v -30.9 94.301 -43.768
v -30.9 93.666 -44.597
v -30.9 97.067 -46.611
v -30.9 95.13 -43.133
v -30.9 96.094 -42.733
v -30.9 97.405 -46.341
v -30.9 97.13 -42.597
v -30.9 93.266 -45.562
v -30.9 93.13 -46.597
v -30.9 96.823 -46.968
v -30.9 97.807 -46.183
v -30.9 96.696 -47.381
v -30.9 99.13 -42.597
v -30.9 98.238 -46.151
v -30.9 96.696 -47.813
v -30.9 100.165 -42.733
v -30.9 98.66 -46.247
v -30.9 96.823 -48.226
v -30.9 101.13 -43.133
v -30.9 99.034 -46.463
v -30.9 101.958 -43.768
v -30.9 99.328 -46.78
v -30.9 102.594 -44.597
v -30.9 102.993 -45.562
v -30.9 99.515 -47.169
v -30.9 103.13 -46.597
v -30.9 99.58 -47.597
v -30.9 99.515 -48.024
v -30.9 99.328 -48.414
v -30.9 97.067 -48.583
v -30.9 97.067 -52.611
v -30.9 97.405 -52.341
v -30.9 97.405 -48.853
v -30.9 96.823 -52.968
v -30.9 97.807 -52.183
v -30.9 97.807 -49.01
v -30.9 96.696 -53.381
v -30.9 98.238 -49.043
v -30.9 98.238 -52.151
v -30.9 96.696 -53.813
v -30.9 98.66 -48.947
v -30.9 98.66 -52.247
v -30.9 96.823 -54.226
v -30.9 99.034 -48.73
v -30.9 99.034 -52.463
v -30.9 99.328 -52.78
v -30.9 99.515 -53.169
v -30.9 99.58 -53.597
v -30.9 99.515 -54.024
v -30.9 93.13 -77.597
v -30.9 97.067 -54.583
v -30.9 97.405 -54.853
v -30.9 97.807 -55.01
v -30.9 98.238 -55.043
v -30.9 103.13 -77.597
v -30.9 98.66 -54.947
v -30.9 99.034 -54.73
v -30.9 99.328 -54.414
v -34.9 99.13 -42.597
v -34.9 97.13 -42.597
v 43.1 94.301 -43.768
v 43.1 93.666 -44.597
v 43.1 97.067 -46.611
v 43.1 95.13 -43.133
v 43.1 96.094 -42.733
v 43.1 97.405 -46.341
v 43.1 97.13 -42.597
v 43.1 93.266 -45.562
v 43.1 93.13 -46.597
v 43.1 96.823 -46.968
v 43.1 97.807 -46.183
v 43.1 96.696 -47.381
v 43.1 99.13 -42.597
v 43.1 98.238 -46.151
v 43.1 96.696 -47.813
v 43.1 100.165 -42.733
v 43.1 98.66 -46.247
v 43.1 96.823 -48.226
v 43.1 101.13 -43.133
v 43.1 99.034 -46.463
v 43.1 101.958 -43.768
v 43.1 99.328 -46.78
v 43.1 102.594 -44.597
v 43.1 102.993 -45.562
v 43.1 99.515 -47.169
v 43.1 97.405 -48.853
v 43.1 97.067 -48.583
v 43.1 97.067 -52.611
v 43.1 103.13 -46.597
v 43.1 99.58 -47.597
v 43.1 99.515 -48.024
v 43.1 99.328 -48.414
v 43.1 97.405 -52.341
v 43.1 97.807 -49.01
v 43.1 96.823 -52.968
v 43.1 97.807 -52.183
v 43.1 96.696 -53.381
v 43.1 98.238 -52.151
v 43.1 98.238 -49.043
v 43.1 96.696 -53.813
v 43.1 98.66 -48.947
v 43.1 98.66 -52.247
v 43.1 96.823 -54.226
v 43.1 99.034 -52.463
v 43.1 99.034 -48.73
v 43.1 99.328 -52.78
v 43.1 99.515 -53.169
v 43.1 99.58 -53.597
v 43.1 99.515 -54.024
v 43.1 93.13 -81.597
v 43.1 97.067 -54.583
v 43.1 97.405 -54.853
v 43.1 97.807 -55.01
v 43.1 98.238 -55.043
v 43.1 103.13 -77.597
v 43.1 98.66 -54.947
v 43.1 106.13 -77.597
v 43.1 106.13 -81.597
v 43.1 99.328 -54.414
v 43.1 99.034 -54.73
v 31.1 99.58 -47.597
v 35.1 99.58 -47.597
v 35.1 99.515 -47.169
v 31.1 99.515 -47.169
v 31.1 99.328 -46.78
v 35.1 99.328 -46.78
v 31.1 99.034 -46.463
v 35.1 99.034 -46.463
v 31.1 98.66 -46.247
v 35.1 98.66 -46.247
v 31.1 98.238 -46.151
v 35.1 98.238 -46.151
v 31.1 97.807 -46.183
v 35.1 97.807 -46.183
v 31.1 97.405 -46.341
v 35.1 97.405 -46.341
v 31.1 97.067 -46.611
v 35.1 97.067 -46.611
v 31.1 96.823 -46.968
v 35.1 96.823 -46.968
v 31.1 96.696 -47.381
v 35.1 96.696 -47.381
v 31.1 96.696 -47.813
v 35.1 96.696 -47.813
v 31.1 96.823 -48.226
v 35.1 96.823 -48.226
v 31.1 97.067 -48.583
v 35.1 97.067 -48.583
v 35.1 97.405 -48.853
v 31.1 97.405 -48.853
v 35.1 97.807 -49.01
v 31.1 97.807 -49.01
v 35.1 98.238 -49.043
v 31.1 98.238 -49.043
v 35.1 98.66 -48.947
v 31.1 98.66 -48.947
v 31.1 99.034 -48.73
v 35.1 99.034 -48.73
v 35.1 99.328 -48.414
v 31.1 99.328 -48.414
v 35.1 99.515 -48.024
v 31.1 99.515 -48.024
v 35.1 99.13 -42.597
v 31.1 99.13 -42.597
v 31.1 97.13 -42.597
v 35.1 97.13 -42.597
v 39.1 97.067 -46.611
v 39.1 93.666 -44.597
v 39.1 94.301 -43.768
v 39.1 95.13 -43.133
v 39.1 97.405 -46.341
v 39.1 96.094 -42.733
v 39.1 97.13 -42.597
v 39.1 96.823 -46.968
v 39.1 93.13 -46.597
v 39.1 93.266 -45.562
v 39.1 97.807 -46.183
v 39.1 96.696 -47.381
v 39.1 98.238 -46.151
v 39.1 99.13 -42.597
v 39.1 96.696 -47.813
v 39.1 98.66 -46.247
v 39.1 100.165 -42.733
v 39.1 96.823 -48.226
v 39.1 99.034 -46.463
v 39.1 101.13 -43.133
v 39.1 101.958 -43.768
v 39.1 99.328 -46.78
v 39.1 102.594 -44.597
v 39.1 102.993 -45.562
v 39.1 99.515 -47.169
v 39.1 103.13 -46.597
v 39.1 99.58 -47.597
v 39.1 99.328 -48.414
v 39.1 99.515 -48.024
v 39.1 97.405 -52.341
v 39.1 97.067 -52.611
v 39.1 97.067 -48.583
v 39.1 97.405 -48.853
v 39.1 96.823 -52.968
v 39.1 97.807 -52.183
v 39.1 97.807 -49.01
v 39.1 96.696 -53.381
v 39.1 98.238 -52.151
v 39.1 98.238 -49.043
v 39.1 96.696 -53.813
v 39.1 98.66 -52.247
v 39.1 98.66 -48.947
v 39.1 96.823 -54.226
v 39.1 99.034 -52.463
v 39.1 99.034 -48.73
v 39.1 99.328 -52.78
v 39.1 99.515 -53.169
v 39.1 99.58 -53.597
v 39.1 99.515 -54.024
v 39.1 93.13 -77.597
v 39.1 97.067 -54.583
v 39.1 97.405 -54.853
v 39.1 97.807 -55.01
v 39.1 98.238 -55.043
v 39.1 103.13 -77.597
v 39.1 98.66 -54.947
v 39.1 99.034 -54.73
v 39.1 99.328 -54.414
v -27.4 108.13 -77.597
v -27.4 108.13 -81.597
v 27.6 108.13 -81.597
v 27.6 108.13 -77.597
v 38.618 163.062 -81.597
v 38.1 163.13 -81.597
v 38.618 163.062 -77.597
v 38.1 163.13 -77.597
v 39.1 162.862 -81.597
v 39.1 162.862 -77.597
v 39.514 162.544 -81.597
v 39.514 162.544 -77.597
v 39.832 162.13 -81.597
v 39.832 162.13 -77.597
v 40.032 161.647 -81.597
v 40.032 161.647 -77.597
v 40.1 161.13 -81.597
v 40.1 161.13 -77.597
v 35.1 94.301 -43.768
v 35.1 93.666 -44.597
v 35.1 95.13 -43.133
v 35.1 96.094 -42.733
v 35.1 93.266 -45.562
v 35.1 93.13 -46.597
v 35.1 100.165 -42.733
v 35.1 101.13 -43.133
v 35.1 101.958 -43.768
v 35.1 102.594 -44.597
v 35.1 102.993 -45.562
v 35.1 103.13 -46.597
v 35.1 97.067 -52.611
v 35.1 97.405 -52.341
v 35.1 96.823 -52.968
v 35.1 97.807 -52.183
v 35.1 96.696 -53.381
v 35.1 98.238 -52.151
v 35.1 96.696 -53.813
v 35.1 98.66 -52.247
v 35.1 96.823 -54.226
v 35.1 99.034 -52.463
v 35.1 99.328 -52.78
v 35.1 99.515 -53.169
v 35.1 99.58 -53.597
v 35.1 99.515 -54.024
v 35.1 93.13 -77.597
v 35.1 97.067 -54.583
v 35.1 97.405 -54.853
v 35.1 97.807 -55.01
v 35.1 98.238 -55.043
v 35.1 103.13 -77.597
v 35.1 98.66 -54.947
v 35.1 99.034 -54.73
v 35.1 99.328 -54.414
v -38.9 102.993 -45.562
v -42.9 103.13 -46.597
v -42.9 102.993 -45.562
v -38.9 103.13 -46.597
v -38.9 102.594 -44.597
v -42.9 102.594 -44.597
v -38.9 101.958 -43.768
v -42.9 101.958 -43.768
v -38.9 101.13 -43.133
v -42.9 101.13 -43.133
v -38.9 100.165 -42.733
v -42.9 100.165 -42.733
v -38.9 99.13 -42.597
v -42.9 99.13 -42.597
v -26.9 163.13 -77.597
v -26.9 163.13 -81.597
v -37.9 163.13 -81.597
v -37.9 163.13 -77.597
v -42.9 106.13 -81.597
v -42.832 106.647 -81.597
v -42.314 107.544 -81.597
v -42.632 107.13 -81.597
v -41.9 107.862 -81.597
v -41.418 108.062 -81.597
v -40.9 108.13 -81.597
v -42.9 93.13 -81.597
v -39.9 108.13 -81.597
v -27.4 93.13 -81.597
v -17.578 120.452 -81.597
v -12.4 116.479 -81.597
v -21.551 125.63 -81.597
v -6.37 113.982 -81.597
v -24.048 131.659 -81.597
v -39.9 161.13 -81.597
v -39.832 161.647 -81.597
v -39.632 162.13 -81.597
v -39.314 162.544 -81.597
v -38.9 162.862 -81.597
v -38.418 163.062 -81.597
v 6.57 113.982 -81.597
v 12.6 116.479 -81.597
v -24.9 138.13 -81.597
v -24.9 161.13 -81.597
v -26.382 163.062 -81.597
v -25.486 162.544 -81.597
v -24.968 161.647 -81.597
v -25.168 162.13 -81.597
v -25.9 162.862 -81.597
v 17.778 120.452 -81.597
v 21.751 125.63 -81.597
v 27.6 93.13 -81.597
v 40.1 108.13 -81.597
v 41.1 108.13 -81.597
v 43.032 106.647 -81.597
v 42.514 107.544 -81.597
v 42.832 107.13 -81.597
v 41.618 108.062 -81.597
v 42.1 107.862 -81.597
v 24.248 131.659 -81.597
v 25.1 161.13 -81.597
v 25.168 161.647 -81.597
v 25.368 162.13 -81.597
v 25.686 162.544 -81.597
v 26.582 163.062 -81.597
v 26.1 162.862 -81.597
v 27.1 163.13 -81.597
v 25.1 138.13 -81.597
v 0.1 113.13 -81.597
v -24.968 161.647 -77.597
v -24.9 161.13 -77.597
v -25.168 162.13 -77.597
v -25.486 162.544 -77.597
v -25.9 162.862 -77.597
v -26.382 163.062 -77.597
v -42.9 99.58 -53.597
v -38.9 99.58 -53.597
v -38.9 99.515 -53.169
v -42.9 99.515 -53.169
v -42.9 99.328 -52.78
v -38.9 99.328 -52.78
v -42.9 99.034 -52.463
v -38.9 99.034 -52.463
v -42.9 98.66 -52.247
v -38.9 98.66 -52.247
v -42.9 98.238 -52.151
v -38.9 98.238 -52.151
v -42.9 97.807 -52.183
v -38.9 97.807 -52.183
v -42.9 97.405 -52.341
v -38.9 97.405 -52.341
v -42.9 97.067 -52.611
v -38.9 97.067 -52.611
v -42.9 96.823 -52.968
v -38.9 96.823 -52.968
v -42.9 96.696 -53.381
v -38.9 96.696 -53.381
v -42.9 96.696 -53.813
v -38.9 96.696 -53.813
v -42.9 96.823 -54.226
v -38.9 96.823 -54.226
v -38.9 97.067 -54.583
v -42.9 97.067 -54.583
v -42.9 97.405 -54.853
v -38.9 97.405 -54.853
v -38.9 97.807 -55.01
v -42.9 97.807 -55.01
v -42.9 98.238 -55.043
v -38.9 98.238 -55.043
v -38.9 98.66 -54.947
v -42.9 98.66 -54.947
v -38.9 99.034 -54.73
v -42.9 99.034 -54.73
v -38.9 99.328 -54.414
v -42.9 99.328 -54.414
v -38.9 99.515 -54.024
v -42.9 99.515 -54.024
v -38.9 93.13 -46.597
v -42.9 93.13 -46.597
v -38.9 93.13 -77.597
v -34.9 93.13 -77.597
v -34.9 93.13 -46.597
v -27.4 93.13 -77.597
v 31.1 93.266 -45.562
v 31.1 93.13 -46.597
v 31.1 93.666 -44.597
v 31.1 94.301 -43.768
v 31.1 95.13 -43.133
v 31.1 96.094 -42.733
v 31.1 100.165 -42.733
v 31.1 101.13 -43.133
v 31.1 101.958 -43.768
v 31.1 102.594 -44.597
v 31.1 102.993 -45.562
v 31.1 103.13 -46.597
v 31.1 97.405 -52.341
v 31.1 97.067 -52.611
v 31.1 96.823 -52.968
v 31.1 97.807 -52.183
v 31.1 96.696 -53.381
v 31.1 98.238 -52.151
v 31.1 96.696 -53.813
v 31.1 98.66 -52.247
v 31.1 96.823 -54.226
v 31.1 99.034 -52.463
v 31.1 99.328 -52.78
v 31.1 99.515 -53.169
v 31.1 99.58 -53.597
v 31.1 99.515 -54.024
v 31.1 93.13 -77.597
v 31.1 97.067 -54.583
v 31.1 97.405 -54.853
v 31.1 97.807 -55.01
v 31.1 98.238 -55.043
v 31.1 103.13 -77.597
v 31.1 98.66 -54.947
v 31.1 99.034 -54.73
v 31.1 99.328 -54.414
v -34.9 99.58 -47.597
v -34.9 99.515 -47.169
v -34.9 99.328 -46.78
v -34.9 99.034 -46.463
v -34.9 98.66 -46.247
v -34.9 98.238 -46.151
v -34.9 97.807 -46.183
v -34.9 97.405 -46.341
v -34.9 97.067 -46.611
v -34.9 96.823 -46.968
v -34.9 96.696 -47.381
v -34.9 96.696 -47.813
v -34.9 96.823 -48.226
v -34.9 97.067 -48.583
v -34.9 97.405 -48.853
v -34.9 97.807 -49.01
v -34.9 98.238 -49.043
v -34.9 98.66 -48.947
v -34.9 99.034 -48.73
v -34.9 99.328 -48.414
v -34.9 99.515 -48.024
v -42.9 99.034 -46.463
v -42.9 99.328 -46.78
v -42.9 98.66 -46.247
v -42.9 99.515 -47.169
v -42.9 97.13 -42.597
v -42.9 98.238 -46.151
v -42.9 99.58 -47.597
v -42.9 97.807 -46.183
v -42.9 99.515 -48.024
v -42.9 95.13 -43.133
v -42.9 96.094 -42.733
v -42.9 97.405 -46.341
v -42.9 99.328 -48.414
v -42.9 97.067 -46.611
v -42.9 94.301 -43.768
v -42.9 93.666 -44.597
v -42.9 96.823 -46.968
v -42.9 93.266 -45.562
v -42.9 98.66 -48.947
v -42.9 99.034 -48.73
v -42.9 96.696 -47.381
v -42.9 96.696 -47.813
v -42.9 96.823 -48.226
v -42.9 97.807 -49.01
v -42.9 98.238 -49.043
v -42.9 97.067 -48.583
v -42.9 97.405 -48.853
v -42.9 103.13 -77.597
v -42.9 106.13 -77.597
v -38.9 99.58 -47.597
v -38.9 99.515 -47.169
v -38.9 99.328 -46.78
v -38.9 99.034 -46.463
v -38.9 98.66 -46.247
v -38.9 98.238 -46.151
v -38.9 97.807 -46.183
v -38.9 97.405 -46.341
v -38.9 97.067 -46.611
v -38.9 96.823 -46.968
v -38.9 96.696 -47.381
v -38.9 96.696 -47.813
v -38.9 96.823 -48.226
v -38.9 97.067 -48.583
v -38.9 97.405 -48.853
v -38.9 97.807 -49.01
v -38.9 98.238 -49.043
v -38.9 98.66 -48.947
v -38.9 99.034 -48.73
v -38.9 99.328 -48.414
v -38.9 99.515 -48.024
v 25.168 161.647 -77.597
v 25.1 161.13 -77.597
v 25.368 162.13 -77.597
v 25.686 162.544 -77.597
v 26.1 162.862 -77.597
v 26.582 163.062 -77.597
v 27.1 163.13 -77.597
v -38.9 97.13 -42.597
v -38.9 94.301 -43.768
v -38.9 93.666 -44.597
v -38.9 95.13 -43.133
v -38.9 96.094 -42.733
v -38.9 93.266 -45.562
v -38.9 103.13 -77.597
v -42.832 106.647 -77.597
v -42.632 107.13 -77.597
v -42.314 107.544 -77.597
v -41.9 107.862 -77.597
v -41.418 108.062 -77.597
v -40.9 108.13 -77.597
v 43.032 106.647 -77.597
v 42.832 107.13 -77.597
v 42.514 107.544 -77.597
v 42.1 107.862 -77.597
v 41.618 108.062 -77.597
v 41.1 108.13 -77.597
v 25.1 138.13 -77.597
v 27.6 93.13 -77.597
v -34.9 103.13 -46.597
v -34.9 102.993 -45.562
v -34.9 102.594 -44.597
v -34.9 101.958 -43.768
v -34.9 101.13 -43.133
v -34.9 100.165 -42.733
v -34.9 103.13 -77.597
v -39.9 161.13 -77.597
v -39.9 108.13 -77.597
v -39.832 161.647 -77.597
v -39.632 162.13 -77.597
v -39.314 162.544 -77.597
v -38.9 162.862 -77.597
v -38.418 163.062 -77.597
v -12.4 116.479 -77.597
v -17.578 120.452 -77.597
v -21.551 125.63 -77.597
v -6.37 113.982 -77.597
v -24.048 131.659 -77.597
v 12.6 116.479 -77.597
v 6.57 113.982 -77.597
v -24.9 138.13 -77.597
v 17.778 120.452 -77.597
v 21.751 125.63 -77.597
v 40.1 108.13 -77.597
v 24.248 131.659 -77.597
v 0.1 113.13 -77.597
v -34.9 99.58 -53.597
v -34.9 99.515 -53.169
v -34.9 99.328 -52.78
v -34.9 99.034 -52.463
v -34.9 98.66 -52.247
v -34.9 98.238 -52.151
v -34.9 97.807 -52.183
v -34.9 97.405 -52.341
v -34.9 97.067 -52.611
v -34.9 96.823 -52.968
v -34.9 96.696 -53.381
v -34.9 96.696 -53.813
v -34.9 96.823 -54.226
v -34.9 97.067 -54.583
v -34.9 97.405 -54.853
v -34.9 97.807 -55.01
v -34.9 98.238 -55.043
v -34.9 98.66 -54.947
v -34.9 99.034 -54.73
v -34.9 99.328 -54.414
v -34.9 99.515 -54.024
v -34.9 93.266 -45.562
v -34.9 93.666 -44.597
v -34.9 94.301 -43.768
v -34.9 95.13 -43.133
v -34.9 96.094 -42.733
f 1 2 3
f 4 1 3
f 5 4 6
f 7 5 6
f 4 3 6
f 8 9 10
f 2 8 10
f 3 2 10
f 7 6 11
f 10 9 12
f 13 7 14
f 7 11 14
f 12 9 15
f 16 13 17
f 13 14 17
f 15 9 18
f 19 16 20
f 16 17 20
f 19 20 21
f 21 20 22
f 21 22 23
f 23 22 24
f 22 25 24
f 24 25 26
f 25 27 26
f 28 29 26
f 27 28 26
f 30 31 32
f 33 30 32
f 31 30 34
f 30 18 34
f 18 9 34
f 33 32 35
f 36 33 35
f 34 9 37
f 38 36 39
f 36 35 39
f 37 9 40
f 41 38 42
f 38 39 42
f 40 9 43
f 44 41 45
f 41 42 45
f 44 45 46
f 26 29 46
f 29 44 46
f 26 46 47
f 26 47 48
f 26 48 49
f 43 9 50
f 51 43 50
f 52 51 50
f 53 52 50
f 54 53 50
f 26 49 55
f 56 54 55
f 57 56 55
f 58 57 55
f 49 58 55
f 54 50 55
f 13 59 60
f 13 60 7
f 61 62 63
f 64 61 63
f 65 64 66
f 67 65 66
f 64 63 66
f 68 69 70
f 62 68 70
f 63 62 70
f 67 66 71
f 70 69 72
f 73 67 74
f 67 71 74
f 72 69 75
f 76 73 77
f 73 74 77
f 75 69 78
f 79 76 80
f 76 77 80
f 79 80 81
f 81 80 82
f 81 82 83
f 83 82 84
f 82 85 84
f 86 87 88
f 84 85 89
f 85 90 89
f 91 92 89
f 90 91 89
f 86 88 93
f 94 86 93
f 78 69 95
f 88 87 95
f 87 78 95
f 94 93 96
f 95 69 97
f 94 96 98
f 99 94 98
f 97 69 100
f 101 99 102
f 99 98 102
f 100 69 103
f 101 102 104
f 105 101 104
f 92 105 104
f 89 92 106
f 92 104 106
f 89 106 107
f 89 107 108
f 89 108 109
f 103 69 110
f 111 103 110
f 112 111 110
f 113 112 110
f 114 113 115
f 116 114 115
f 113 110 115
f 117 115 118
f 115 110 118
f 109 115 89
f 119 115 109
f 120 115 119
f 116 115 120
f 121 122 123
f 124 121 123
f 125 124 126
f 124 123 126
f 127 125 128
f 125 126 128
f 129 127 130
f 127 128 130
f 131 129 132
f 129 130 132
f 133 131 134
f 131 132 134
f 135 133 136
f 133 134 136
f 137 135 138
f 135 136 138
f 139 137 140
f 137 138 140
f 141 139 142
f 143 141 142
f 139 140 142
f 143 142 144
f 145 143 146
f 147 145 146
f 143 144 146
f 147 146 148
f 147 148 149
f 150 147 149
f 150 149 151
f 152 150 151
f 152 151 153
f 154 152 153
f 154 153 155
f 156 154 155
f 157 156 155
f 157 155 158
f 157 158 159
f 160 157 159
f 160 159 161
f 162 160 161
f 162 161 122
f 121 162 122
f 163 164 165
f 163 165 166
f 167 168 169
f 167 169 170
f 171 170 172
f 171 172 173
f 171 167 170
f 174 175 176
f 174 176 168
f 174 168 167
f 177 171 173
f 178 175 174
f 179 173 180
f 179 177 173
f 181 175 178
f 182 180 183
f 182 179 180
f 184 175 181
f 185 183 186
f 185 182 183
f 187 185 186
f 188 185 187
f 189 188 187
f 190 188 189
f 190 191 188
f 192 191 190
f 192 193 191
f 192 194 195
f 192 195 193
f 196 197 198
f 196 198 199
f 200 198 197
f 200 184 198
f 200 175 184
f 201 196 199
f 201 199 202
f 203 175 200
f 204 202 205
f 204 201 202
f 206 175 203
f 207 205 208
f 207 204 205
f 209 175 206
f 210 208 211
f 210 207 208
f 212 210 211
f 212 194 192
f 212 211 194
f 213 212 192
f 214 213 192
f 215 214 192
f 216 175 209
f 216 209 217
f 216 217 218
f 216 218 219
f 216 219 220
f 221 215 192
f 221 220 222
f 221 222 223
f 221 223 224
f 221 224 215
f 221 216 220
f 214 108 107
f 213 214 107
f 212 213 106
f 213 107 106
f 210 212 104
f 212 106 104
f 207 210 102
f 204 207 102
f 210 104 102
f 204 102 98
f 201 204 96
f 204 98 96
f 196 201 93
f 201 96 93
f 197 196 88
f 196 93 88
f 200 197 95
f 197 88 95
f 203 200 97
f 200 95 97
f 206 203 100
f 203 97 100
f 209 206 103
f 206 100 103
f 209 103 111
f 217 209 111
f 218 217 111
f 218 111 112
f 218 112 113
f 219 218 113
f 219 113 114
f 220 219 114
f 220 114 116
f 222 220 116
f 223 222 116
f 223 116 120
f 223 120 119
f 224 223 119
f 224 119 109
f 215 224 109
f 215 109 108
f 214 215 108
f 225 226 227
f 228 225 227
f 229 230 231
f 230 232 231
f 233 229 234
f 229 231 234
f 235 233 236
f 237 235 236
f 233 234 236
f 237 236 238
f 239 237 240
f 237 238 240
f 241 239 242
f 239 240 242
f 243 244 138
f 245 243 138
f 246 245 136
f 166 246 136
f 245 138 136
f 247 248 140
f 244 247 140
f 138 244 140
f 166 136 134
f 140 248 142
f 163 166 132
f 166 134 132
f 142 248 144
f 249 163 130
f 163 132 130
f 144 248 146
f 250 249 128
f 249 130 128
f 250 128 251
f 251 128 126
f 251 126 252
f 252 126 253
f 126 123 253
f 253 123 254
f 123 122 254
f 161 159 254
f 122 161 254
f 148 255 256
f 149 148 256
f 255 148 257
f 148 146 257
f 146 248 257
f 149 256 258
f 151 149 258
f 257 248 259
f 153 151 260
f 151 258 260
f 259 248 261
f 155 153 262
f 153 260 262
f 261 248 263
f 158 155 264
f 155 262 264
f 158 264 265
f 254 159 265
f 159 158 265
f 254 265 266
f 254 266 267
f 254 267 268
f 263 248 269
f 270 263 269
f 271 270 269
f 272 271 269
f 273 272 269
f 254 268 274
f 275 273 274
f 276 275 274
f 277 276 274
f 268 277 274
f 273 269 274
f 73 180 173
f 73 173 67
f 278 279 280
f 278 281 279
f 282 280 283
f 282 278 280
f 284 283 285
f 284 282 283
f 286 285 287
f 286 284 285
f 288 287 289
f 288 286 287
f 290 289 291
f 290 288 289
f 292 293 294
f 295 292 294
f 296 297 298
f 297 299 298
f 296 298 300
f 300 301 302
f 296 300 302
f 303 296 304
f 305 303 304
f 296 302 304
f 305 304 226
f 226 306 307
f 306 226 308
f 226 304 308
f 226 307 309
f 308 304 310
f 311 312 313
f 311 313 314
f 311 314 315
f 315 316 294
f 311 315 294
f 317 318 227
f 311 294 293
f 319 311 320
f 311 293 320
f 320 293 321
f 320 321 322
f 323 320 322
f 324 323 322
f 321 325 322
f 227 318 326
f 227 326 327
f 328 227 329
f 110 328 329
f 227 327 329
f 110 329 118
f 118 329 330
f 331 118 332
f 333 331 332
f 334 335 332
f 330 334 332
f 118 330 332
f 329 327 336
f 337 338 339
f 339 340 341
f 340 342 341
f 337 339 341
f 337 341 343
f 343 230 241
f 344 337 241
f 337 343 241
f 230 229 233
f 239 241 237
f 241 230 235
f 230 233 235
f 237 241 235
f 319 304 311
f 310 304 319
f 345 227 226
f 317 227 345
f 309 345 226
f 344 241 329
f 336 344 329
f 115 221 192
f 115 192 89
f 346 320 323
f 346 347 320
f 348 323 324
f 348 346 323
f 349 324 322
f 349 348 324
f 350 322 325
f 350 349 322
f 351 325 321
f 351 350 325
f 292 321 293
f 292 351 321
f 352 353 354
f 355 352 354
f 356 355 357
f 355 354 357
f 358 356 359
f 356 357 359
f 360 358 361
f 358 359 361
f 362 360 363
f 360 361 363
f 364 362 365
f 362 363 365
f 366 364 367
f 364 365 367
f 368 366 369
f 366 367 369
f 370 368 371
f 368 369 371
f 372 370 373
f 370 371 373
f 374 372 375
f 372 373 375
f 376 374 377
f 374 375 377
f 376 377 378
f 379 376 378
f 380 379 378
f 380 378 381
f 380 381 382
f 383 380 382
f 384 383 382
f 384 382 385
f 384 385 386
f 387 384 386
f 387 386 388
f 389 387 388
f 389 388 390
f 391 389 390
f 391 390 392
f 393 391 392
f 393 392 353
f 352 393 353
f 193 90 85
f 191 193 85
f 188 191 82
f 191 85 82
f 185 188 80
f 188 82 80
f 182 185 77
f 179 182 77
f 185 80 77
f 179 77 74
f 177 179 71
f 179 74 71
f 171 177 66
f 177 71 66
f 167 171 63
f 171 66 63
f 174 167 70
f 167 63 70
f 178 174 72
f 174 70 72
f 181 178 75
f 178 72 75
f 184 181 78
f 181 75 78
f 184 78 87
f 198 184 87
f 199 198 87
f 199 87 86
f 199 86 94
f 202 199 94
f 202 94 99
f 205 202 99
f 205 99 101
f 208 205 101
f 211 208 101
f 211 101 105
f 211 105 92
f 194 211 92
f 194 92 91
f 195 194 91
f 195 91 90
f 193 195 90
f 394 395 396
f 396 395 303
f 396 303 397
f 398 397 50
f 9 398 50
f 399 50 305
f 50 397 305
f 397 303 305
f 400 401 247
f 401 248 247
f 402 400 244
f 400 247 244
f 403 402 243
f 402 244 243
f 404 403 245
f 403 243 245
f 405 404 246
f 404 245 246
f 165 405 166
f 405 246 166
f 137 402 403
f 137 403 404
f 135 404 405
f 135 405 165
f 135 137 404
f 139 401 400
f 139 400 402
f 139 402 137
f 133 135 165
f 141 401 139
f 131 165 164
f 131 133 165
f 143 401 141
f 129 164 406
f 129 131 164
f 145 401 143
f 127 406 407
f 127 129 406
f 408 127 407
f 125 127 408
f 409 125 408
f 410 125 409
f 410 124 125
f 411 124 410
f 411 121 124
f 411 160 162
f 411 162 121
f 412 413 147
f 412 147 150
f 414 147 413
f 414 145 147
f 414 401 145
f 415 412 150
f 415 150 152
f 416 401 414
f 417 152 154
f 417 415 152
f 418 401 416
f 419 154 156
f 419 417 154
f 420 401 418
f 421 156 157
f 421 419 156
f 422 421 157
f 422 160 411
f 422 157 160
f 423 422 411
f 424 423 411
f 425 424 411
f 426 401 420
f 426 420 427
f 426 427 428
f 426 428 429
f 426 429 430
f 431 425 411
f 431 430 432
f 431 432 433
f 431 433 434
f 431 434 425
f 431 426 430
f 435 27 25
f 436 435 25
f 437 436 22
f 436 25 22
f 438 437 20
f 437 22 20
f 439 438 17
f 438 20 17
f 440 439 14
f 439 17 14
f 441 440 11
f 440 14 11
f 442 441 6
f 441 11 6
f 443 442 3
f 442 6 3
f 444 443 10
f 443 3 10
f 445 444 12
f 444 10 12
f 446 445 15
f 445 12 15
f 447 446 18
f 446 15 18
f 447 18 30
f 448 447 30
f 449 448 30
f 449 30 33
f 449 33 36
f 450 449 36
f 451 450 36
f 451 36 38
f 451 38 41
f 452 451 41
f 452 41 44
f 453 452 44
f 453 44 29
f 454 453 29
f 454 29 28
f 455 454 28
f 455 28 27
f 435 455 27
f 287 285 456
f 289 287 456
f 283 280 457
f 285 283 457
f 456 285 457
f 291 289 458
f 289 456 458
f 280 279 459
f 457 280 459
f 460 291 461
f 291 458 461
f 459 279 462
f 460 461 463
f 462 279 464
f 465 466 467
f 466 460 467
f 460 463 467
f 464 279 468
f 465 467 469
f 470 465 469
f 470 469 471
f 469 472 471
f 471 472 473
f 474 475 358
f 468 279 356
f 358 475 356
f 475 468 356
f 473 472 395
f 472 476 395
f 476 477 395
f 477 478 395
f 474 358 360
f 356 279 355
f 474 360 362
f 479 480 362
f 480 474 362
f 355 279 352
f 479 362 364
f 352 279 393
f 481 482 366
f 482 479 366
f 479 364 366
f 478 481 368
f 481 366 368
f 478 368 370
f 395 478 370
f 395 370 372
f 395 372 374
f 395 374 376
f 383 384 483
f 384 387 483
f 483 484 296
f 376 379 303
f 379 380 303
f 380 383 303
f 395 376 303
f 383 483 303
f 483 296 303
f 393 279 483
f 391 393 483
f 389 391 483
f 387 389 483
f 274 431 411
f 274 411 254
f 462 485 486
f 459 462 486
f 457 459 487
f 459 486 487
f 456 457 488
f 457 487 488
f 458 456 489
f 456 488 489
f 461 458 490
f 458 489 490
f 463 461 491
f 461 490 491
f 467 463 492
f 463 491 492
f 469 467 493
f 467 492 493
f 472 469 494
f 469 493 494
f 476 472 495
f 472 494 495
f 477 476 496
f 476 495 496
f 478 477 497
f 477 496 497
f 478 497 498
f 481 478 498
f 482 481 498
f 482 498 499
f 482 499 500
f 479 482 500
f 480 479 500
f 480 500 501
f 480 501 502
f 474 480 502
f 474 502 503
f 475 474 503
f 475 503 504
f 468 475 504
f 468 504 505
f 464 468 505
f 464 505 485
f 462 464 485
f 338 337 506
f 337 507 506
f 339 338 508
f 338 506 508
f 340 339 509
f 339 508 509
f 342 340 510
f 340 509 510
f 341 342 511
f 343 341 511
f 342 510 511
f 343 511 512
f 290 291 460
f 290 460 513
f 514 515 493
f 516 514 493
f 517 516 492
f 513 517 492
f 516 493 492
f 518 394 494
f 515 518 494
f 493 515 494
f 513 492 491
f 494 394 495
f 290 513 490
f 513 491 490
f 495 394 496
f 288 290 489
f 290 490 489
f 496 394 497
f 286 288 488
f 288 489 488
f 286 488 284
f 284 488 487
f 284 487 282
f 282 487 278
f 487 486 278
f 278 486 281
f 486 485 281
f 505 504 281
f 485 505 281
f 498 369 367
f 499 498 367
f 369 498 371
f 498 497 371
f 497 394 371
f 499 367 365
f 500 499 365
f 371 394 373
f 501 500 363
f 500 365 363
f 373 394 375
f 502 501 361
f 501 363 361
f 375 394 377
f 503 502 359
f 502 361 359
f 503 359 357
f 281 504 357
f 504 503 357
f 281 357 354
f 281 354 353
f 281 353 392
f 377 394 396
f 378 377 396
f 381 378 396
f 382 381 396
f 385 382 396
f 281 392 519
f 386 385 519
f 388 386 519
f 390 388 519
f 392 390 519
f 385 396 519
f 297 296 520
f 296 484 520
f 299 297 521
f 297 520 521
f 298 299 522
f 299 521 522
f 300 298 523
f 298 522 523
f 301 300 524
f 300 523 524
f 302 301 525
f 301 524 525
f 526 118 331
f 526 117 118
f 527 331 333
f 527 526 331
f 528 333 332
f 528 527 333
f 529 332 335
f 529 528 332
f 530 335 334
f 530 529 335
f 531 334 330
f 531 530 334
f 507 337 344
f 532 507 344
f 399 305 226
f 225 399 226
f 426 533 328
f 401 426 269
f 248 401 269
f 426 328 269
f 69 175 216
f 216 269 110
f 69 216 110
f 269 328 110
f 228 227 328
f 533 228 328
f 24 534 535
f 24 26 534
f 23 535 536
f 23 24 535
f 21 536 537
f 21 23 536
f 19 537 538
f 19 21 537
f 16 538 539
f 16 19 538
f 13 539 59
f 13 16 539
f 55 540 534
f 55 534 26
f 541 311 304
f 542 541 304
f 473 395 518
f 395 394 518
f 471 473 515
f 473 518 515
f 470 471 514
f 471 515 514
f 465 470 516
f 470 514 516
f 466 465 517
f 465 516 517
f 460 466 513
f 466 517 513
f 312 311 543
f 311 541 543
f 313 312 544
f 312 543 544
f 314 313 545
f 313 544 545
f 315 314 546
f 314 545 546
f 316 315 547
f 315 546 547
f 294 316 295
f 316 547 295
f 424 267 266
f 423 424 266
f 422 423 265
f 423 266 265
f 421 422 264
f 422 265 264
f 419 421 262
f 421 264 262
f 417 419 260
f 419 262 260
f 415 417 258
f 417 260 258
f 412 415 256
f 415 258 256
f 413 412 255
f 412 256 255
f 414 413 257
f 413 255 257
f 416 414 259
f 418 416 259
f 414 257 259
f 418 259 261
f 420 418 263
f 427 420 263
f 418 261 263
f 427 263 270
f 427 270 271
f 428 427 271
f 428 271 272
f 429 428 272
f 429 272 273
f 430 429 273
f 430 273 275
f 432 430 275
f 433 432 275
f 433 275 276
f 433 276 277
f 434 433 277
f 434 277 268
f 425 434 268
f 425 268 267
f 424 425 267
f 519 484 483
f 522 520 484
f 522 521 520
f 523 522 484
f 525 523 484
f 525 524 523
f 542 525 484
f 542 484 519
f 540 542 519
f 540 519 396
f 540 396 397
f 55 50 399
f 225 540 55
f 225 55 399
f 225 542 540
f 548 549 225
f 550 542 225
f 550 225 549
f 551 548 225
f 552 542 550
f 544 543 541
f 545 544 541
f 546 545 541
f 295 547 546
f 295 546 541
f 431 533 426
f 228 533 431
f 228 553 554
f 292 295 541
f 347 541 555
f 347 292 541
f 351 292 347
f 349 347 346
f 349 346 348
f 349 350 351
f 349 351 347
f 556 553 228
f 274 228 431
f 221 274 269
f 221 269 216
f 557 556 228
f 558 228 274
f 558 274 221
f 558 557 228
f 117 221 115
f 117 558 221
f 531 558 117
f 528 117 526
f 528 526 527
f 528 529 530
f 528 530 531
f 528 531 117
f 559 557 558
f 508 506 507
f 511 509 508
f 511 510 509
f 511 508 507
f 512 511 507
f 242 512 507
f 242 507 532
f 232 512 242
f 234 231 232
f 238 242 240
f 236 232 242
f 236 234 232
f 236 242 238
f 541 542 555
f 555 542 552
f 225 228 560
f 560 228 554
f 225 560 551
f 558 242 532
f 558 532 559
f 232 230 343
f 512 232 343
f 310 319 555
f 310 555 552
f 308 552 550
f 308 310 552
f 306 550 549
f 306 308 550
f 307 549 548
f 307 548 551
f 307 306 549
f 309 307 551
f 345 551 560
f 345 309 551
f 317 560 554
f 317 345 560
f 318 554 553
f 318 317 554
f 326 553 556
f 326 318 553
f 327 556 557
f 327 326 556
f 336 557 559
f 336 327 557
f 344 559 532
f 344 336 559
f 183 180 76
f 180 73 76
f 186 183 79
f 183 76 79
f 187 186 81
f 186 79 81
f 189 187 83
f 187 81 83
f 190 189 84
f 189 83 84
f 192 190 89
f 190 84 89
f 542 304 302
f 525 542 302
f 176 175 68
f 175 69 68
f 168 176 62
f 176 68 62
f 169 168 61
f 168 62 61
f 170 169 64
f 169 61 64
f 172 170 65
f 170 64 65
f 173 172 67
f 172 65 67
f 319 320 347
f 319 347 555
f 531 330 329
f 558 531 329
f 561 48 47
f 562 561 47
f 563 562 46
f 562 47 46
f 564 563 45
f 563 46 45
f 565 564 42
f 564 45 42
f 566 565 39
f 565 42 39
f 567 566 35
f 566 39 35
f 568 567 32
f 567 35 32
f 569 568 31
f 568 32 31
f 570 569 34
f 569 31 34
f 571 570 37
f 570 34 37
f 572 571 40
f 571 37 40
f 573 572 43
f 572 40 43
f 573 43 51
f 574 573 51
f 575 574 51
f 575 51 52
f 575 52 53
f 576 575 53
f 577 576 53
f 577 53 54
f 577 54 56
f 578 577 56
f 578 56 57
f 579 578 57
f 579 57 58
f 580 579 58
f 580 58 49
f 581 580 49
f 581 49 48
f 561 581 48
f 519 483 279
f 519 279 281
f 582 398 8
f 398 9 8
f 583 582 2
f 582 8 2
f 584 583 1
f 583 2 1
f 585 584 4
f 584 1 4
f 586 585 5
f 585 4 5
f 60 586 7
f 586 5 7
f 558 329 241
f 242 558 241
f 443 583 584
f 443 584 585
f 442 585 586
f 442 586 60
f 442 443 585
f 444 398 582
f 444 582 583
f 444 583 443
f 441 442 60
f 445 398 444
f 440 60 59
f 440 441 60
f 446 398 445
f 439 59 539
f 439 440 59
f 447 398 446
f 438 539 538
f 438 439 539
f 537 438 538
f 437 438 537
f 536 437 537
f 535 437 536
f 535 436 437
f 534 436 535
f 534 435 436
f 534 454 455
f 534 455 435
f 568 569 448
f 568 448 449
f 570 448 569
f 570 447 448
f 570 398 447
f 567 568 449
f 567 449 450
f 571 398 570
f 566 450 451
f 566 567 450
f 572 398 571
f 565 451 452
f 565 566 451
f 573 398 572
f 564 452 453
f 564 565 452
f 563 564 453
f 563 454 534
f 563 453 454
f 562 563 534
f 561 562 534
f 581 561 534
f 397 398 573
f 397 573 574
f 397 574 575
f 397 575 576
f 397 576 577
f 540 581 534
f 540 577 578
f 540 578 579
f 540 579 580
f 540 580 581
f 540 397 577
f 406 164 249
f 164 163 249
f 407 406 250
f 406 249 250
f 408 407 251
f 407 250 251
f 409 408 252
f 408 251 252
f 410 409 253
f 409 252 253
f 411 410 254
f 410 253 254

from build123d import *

# Parameters (mm, degrees)
PAD007_DEPTH  = 4
SKETCH023_W   = 4
SKETCH023_H   = 10
PAD008_DEPTH  = 35
SKETCH024_R   = 1.45
HOLE005_DEPTH = 86.001
FILLET004_R   = 4
FILLET005_R   = 2


with BuildPart() as part:
    # Sketch022 (on DatumPlane) → Pad007 (new body)
    with BuildSketch(Plane(origin=(-27.5, 0, -70), x_dir=(1, 0, 0), z_dir=(0, 0, 1))):
        with BuildLine():
            Line((2.5, 164.5), (-12.5, 164.5))
            Line((-12.5, 164.5), (-12.5, 109.5))
            Line((-12.5, 109.5), (-15.499998, 109.5))
            Line((-15.499998, 109.5), (-15.499998, 94.5))
            Line((-15.499998, 94.5), (2e-06, 94.5))
            Line((2e-06, 94.5), (2e-06, 109.499996))
            Line((2e-06, 109.499996), (55.000002, 109.5))
            Line((55.000002, 109.5), (55.000002, 94.5))
            Line((55.000002, 94.5), (70.500002, 94.5))
            Line((70.500002, 94.5), (70.500002, 109.5))
            Line((70.500002, 109.5), (67.500004, 109.5))
            Line((67.500004, 109.5), (67.500004, 164.5))
            Line((67.500004, 164.5), (52.500004, 164.5))
            Line((52.500004, 164.5), (52.5, 139.499996))
            ThreePointArc((2.5, 139.5), (27.499998, 114.5), (52.5, 139.499996))
            Line((2.5, 164.5), (2.5, 139.5))
        make_face()
    extrude(amount=PAD007_DEPTH)

    # Sketch023 (on Face18 of Pad007) → Pad008 (join)
    with BuildSketch(Plane(origin=(-27.5, 0, -66), x_dir=(1, 0, 0), z_dir=(0, 0, 1))):
        with Locations((-5.499998, 99.5)):
            Rectangle(SKETCH023_W, SKETCH023_H)
        with Locations((60.500002, 99.5)):
            Rectangle(SKETCH023_W, SKETCH023_H)
        with Locations((68.500002, 99.5)):
            Rectangle(SKETCH023_W, SKETCH023_H)
        with Locations((-13.499998, 99.5)):
            Rectangle(SKETCH023_W, SKETCH023_H)
    extrude(amount=PAD008_DEPTH)

    # Sketch024 (on Face32 of Pad008) → Hole005 (cut, through all)
    with BuildSketch(Plane(origin=(43.000002, 0, -70), x_dir=(0, 1, 0), z_dir=(1, 0, 0))):
        with Locations((99.5, 34)):
            Circle(SKETCH024_R)
        with Locations((99.5, 28)):
            Circle(SKETCH024_R)
    extrude(amount=-HOLE005_DEPTH, mode=Mode.SUBTRACT)

    # Fillet004
    fillet004_edges = [part.edges().sort_by_distance(p)[0] for p in [
        (-40.999998, 94.5, -31),
        (-40.999998, 104.5, -31),
        (-32.999998, 104.5, -31),
        (-32.999998, 94.5, -31),
        (33.000002, 94.5, -31),
        (33.000002, 104.5, -31),
        (41.000002, 104.5, -31),
        (41.000002, 94.5, -31),
    ]]
    fillet(fillet004_edges, radius=FILLET004_R)

    # Fillet005
    fillet005_edges = [part.edges().sort_by_distance(p)[0] for p in [
        (43.000002, 109.5, -68),
        (40.000004, 164.5, -68),
        (25.000004, 164.5, -68),
        (-25, 164.5, -68),
        (-40, 164.5, -68),
        (-42.999998, 109.5, -68),
    ]]
    fillet(fillet005_edges, radius=FILLET005_R)


with BuildPart() as part_1:
    # Body002 placement: moved
    add(part.part.moved(Location((0.099998, -1.370226, -11.596799))))


solid = part_1.part
